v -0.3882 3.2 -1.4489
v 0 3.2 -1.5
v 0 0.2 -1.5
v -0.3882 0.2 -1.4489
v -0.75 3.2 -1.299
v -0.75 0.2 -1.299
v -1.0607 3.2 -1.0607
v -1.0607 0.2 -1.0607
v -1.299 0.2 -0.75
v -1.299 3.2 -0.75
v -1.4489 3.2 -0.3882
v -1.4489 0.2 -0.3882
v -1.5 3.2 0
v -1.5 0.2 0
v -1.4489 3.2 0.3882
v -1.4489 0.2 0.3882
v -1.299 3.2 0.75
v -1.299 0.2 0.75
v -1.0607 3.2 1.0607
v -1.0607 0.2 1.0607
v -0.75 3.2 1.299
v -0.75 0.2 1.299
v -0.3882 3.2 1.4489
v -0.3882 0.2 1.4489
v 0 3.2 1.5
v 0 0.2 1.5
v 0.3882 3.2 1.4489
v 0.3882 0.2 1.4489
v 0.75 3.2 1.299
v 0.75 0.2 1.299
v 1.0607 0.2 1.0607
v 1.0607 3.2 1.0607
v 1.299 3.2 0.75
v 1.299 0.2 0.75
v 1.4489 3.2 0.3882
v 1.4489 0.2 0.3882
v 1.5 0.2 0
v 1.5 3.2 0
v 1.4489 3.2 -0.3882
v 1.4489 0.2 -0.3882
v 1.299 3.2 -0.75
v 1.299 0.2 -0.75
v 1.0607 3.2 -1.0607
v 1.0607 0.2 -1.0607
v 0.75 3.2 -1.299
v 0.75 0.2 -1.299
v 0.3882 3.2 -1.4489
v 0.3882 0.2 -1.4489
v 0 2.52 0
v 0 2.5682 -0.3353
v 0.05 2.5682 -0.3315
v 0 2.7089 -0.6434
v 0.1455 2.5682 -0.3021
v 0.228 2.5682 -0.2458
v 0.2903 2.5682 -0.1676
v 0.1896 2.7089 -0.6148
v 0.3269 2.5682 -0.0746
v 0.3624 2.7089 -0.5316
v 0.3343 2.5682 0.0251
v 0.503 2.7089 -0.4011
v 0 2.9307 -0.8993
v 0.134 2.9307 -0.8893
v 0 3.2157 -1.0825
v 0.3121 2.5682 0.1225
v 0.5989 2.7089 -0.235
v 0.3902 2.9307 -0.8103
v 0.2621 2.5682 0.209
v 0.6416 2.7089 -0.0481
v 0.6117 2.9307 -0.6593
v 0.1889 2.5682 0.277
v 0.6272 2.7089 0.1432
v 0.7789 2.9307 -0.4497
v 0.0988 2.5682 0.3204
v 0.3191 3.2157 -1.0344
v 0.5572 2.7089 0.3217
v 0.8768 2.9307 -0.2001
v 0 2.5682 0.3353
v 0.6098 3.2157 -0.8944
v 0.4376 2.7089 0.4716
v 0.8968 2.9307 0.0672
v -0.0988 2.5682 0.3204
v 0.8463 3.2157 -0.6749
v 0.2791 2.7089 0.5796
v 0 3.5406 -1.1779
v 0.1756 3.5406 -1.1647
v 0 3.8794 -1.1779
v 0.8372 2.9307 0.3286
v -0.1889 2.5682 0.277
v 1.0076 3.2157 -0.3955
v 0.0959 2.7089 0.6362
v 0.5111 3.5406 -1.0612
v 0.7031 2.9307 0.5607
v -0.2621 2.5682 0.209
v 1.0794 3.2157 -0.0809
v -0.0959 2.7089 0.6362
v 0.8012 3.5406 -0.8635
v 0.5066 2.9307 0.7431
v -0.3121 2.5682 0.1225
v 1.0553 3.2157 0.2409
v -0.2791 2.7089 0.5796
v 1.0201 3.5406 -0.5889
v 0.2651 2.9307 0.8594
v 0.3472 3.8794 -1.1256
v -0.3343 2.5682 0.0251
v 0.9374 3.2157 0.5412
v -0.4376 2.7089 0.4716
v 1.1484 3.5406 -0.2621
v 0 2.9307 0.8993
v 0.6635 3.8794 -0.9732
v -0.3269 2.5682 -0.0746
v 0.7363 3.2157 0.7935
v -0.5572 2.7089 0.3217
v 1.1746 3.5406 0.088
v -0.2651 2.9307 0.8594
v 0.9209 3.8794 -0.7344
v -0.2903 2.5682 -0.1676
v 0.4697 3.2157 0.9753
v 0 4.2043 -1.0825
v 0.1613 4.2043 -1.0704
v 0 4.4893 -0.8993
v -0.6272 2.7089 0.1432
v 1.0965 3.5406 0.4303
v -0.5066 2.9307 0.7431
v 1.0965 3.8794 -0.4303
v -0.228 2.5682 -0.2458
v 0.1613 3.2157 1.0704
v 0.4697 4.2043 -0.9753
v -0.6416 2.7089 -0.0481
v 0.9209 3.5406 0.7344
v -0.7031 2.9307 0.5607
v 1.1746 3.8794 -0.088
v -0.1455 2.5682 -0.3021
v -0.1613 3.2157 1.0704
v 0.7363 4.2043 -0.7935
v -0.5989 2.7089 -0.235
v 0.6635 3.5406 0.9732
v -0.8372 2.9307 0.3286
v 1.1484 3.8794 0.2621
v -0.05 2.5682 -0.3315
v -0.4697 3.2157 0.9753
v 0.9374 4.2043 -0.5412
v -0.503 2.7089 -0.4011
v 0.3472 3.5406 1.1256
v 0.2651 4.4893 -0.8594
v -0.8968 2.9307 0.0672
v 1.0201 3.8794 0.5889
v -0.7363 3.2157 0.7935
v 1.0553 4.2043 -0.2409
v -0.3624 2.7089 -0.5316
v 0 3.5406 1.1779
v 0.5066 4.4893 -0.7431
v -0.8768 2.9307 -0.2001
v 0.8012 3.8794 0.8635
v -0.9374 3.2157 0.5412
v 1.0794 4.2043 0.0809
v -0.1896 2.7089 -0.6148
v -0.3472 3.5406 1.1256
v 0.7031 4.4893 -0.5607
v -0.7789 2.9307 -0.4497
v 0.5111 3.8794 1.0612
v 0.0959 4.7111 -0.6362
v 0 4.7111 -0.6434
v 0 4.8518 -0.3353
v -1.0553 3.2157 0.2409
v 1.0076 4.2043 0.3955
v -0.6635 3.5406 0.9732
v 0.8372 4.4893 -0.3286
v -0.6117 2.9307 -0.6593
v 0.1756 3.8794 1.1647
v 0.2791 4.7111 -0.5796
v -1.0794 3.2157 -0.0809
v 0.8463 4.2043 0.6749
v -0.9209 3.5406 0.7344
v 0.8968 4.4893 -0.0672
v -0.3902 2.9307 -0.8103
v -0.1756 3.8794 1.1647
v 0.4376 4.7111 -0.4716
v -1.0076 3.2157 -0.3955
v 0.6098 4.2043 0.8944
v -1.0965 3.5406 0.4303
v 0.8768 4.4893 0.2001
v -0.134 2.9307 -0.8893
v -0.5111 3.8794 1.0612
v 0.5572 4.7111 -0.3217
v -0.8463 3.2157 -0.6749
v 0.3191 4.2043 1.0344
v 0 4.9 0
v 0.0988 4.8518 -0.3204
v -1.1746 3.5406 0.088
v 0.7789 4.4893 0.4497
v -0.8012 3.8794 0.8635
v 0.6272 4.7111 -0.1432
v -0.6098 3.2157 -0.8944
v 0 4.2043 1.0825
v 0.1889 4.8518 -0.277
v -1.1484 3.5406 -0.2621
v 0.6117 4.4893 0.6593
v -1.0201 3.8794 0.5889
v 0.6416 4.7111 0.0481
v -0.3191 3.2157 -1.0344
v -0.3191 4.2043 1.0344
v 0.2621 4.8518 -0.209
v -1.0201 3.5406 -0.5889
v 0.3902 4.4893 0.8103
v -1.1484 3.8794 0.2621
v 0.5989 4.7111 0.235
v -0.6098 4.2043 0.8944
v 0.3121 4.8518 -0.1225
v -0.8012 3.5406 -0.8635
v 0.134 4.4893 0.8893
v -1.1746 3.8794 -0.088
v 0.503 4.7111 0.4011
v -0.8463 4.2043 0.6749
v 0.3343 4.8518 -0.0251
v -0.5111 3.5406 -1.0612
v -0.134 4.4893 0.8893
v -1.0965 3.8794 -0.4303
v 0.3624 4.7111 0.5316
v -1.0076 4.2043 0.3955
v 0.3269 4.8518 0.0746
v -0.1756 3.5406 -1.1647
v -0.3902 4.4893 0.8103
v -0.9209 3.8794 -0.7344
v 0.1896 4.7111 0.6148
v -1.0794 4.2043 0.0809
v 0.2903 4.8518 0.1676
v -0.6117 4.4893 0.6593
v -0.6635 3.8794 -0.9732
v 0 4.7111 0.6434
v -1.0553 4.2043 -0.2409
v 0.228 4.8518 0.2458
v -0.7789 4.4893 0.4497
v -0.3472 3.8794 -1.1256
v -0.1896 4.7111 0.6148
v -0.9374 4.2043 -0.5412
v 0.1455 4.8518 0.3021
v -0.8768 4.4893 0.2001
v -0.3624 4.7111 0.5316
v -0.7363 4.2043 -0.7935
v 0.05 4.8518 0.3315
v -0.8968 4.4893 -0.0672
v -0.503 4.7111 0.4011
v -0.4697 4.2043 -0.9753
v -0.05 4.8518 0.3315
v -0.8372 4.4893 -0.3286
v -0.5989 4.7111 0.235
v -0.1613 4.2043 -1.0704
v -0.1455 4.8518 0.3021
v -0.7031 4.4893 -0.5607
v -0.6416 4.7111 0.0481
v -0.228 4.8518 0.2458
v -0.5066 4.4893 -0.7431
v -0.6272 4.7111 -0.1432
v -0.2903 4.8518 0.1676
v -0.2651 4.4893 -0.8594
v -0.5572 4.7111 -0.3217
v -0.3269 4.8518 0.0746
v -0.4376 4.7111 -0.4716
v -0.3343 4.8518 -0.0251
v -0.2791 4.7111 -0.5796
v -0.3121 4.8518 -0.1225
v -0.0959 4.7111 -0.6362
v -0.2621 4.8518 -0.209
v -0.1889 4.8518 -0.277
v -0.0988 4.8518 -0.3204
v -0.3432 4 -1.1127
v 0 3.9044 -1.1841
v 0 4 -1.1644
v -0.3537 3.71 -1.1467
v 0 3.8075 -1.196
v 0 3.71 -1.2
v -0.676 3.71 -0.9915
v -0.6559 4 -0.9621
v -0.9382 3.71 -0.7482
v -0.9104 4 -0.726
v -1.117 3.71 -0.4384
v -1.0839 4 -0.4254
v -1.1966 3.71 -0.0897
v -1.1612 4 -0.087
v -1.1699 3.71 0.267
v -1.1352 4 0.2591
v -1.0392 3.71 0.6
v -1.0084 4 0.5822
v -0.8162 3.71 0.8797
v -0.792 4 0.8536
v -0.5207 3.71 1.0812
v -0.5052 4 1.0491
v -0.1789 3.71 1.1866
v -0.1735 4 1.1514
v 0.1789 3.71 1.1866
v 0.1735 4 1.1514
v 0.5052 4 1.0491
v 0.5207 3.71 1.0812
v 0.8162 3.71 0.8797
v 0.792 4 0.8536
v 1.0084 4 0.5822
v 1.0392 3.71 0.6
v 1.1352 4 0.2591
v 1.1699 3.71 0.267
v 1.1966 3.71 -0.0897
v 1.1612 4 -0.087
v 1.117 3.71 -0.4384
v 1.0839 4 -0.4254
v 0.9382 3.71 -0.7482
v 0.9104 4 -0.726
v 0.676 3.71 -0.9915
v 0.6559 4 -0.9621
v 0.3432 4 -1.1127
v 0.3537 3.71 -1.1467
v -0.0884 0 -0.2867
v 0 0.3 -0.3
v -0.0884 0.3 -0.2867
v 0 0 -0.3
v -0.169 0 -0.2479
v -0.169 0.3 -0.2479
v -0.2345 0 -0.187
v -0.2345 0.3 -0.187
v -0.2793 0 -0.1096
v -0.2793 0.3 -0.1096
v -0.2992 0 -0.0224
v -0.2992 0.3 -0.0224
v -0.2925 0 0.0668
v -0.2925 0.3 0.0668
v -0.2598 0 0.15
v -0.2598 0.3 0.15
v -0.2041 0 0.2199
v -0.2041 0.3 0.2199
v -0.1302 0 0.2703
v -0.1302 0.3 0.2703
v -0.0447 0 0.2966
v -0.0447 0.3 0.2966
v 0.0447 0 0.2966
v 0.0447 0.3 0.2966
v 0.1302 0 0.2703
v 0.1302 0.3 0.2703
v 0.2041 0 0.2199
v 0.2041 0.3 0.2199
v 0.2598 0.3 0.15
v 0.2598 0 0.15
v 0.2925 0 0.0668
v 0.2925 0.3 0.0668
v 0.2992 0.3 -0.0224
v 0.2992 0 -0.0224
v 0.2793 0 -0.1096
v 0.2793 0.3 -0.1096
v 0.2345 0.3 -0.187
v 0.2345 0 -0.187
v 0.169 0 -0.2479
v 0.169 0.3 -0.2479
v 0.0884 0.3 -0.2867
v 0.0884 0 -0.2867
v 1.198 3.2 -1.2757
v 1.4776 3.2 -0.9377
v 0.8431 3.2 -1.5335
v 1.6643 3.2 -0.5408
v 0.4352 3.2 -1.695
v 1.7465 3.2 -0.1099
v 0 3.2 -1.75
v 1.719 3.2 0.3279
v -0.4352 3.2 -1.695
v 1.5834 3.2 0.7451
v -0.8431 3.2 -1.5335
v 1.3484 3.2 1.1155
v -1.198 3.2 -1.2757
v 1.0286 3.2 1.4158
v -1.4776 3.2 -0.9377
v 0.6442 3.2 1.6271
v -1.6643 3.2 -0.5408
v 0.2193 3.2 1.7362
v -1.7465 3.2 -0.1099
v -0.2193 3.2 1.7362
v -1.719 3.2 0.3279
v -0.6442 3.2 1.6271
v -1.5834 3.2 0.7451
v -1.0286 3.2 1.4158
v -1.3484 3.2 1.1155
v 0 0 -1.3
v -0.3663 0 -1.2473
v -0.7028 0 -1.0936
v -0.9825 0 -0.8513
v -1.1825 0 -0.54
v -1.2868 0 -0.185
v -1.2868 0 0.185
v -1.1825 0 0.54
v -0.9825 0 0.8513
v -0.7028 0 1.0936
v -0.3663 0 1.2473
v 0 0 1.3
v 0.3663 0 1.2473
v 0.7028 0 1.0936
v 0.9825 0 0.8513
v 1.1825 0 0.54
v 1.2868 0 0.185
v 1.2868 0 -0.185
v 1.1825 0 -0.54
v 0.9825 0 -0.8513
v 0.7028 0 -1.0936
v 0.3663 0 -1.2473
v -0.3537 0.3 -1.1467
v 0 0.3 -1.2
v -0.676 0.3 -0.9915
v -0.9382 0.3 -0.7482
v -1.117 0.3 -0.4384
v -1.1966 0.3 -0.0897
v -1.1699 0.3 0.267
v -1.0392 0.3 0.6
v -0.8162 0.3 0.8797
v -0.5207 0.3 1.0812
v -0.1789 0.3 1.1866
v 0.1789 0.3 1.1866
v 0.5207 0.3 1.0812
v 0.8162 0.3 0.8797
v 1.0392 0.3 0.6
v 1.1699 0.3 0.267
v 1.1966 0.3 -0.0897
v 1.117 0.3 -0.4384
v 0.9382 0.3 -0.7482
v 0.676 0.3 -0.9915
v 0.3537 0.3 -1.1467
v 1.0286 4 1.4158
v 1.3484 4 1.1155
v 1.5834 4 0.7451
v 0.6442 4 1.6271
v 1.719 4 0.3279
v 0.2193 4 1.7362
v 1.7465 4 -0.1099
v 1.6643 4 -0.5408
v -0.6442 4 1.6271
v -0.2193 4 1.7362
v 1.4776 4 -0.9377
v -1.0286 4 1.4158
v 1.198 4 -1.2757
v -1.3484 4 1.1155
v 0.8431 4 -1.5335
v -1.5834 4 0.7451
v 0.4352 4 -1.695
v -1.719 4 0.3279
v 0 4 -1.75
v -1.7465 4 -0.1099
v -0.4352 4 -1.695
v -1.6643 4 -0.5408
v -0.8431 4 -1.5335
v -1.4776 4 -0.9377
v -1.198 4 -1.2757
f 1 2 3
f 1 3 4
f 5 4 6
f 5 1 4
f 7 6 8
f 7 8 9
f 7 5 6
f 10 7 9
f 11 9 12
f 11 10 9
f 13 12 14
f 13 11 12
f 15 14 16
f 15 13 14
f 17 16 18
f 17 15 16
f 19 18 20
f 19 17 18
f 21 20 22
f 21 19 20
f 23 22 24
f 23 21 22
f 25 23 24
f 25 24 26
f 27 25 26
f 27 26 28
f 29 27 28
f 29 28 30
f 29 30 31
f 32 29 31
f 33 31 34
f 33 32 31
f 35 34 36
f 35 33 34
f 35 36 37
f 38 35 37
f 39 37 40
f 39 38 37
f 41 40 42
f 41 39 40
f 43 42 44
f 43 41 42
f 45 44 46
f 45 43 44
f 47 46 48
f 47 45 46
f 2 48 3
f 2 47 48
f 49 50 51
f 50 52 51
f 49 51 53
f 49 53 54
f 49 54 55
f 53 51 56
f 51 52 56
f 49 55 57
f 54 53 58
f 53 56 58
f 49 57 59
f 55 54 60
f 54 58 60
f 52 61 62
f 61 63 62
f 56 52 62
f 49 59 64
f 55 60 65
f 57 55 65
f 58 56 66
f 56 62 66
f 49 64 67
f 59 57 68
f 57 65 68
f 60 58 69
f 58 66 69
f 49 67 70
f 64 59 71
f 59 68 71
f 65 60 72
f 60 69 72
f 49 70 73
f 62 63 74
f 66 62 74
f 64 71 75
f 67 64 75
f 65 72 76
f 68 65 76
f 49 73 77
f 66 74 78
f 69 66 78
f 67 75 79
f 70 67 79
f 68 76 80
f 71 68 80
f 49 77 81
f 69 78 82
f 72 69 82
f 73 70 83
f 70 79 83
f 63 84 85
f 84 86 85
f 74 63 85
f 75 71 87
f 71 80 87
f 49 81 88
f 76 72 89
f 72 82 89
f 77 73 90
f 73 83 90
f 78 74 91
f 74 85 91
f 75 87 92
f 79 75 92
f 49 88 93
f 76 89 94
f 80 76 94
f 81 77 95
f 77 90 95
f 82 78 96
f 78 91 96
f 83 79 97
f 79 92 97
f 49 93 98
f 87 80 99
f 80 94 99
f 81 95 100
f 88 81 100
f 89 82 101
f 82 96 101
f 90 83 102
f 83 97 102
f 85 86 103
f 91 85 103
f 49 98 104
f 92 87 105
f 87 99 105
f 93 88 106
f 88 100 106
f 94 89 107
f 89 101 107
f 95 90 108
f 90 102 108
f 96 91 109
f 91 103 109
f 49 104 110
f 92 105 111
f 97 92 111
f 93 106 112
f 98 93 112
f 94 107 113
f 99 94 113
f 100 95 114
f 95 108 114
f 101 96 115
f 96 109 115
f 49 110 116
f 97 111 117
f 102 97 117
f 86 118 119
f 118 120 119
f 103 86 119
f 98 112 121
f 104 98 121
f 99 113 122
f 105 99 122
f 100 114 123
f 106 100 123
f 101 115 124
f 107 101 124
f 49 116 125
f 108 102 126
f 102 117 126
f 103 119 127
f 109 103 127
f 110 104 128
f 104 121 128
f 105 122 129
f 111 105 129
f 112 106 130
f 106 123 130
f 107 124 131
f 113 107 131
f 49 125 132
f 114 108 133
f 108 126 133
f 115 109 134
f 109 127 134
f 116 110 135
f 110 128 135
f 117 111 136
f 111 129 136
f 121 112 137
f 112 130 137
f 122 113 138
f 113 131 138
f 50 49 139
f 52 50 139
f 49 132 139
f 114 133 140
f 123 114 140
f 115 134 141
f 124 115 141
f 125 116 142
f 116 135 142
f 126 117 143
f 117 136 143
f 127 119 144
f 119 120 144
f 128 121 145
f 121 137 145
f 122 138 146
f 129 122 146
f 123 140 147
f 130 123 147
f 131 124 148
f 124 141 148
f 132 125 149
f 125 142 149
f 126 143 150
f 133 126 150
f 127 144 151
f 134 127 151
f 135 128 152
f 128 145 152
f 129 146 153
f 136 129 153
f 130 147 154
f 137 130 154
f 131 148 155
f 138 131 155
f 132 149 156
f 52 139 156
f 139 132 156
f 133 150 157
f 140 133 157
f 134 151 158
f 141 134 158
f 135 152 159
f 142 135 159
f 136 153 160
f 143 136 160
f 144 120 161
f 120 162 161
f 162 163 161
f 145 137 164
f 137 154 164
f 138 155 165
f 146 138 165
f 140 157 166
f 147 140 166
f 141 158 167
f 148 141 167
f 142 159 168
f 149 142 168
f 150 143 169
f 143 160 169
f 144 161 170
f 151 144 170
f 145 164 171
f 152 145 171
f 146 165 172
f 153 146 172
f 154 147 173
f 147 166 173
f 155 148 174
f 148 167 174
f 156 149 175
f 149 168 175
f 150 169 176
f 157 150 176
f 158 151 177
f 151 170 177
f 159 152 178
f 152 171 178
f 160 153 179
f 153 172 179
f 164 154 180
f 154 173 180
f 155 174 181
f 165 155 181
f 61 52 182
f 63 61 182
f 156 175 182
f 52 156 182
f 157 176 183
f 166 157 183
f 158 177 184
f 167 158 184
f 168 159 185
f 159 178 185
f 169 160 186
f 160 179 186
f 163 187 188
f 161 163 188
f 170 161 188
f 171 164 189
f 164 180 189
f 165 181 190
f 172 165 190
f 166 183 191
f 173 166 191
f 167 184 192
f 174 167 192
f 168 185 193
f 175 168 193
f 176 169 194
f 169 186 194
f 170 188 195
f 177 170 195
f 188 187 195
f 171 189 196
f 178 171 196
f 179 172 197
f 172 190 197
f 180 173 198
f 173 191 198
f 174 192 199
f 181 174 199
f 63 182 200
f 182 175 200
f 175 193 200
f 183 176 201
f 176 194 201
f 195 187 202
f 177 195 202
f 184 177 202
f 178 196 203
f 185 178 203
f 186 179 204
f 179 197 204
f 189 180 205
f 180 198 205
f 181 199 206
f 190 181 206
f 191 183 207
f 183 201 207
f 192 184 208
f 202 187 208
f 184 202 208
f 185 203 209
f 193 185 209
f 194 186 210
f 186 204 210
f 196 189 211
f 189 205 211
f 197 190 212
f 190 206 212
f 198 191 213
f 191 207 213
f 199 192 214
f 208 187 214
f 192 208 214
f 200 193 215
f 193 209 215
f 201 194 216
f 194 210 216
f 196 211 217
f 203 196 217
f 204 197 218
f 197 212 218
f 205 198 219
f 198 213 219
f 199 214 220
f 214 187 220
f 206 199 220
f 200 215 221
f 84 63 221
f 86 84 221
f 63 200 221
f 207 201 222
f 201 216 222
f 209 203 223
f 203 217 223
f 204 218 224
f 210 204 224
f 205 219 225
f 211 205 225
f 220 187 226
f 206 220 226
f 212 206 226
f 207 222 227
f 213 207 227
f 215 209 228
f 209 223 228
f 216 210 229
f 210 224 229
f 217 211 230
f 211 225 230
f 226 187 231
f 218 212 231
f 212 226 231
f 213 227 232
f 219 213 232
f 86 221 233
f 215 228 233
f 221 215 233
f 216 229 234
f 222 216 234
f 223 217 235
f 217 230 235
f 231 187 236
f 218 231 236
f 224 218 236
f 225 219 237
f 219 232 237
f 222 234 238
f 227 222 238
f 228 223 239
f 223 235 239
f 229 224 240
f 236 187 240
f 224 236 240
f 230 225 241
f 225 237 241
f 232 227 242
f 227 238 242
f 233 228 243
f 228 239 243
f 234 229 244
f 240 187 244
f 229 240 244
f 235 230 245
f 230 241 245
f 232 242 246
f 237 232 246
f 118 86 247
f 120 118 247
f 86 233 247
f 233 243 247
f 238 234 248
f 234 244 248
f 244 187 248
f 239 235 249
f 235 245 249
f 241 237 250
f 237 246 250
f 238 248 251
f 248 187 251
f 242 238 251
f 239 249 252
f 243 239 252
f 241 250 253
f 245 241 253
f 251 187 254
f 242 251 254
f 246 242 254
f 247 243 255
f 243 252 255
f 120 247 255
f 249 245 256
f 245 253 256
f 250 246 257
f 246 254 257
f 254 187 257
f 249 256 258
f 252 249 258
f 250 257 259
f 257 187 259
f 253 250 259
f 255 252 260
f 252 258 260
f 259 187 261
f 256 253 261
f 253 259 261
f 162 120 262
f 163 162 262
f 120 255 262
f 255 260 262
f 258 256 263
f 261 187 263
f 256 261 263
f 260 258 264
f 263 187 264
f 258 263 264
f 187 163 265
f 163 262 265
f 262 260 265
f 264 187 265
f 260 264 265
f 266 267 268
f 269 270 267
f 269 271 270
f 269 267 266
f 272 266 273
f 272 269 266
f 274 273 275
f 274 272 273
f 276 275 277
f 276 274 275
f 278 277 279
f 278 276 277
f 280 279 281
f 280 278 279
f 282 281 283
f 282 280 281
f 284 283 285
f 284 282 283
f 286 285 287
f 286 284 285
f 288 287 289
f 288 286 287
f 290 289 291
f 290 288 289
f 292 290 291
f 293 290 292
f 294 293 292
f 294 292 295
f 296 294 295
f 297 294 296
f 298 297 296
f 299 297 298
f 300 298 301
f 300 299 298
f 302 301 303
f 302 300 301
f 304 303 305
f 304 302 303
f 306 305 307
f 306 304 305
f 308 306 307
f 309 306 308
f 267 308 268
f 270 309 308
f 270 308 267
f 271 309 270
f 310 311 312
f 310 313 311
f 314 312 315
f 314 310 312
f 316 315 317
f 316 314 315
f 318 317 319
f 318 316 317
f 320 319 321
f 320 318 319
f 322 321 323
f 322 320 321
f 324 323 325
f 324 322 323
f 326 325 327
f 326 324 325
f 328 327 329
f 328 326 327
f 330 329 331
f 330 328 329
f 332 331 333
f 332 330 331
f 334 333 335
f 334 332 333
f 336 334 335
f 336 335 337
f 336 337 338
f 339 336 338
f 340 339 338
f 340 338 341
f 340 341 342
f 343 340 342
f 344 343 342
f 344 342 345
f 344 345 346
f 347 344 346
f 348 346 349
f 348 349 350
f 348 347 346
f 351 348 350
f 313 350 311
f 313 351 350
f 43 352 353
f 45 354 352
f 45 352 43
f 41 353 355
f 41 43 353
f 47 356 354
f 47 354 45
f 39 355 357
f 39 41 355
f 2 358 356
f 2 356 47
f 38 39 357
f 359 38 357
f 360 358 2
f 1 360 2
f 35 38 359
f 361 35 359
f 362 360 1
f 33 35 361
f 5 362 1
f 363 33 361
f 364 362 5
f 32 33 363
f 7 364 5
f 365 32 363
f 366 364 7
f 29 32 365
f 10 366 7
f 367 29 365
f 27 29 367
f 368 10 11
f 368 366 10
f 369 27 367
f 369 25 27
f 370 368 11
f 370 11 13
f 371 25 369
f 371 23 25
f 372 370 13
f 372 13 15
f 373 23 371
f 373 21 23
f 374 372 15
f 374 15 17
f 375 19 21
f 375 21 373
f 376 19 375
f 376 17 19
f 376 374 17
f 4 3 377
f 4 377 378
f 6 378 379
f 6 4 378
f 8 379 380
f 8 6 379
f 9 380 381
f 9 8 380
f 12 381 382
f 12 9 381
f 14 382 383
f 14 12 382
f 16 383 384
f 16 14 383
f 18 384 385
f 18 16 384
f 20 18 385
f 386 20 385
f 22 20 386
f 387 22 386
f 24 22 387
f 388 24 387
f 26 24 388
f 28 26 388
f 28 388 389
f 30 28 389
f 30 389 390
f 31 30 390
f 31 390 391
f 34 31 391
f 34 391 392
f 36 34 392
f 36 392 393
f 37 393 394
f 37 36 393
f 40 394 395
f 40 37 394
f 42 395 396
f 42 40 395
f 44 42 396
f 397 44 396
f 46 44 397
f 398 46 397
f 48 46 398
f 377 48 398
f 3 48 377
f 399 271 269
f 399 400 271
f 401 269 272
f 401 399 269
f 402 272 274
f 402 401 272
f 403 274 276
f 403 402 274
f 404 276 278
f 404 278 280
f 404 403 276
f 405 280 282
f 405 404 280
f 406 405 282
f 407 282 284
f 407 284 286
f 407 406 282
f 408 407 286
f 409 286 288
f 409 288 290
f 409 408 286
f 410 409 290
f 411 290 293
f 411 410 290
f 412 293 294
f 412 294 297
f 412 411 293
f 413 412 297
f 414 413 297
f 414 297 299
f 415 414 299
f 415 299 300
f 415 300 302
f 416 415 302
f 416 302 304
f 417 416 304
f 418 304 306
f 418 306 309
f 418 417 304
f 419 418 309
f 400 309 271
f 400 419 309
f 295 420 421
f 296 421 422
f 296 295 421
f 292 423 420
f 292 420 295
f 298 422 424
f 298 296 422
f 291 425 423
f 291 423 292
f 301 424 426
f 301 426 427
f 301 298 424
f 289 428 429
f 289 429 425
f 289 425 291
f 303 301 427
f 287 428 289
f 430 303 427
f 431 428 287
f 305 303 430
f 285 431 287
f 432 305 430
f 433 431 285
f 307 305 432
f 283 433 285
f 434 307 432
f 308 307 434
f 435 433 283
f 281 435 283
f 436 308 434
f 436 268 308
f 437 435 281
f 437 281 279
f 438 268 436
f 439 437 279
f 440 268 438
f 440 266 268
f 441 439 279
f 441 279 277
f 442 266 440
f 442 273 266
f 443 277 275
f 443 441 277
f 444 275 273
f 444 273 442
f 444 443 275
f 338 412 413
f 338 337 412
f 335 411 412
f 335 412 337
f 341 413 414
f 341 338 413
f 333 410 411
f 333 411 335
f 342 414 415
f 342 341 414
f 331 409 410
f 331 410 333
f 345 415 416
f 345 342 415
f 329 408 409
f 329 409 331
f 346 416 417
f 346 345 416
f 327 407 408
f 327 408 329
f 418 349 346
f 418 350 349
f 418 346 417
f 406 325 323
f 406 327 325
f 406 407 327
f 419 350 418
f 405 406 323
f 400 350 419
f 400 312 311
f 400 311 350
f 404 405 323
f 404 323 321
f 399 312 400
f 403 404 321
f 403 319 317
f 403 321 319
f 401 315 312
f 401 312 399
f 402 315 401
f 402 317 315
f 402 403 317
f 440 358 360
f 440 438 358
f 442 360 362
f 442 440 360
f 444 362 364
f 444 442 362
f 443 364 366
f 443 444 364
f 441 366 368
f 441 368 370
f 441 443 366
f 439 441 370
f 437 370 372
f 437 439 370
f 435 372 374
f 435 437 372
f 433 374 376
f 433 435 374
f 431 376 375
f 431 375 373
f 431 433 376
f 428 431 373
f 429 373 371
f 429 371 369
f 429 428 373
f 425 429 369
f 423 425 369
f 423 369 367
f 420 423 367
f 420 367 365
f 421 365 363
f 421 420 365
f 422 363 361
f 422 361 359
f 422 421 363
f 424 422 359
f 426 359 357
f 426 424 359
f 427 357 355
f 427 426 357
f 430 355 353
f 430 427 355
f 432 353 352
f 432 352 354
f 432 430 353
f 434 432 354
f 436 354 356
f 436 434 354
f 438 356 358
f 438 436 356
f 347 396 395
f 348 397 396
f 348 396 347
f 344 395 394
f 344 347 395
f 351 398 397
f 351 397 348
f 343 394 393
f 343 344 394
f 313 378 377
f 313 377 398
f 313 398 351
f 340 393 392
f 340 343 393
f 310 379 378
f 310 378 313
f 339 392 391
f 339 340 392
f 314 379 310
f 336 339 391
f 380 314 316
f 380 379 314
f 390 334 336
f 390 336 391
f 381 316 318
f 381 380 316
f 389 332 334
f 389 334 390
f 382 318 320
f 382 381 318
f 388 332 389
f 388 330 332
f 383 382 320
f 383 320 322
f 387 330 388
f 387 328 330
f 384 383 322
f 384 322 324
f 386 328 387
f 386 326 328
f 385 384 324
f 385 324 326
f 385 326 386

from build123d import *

# Parameters (mm, degrees)
CHAMFER_1_SIZE = 0.2


with BuildPart() as part:
    # 草图1 → 旋转1 (revolve)
    with BuildSketch(Plane(origin=(0, 0, 0), x_dir=(0, 0, -1), z_dir=(1, 0, 0))):
        with BuildLine():
            Line((0.3, 0), (1.5, 0))
            Line((1.5, 0), (1.5, 3.2))
            Line((1.5, 3.2), (1.75, 3.2))
            Line((1.75, 3.2), (1.75, 4))
            Line((1.75, 4), (1.164431192, 4))
            ThreePointArc((1.164431192, 4), (1.191074605, 3.856086567), (1.2, 3.71))
            Line((1.2, 3.71), (1.2, 0.3))
            Line((1.2, 0.3), (0.3, 0.3))
            Line((0.3, 0.3), (0.3, 0))
        make_face()
    revolve(axis=Axis((0, 0, 0), (0, 1, 0)))

    # 倒角1
    chamfer_1_edges = [part.edges().sort_by_distance(p)[0] for p in [
        (0, 0, 1.5),
    ]]
    chamfer(chamfer_1_edges, length=CHAMFER_1_SIZE)


with BuildPart() as body_2:
    # 草图2 → 旋转2 (revolve)
    with BuildSketch(Plane(origin=(0, 0, 0), x_dir=(0, 0, -1), z_dir=(1, 0, 0))):
        with BuildLine():
            Line((0, 4.9), (0, 2.52))
            ThreePointArc((0, 2.52), (1.19, 3.71), (0, 4.9))
        make_face()
    revolve(axis=Axis((0, 5.532857048, 0), (0, -1, 0)))


solid = Compound([part.part, body_2.part])
